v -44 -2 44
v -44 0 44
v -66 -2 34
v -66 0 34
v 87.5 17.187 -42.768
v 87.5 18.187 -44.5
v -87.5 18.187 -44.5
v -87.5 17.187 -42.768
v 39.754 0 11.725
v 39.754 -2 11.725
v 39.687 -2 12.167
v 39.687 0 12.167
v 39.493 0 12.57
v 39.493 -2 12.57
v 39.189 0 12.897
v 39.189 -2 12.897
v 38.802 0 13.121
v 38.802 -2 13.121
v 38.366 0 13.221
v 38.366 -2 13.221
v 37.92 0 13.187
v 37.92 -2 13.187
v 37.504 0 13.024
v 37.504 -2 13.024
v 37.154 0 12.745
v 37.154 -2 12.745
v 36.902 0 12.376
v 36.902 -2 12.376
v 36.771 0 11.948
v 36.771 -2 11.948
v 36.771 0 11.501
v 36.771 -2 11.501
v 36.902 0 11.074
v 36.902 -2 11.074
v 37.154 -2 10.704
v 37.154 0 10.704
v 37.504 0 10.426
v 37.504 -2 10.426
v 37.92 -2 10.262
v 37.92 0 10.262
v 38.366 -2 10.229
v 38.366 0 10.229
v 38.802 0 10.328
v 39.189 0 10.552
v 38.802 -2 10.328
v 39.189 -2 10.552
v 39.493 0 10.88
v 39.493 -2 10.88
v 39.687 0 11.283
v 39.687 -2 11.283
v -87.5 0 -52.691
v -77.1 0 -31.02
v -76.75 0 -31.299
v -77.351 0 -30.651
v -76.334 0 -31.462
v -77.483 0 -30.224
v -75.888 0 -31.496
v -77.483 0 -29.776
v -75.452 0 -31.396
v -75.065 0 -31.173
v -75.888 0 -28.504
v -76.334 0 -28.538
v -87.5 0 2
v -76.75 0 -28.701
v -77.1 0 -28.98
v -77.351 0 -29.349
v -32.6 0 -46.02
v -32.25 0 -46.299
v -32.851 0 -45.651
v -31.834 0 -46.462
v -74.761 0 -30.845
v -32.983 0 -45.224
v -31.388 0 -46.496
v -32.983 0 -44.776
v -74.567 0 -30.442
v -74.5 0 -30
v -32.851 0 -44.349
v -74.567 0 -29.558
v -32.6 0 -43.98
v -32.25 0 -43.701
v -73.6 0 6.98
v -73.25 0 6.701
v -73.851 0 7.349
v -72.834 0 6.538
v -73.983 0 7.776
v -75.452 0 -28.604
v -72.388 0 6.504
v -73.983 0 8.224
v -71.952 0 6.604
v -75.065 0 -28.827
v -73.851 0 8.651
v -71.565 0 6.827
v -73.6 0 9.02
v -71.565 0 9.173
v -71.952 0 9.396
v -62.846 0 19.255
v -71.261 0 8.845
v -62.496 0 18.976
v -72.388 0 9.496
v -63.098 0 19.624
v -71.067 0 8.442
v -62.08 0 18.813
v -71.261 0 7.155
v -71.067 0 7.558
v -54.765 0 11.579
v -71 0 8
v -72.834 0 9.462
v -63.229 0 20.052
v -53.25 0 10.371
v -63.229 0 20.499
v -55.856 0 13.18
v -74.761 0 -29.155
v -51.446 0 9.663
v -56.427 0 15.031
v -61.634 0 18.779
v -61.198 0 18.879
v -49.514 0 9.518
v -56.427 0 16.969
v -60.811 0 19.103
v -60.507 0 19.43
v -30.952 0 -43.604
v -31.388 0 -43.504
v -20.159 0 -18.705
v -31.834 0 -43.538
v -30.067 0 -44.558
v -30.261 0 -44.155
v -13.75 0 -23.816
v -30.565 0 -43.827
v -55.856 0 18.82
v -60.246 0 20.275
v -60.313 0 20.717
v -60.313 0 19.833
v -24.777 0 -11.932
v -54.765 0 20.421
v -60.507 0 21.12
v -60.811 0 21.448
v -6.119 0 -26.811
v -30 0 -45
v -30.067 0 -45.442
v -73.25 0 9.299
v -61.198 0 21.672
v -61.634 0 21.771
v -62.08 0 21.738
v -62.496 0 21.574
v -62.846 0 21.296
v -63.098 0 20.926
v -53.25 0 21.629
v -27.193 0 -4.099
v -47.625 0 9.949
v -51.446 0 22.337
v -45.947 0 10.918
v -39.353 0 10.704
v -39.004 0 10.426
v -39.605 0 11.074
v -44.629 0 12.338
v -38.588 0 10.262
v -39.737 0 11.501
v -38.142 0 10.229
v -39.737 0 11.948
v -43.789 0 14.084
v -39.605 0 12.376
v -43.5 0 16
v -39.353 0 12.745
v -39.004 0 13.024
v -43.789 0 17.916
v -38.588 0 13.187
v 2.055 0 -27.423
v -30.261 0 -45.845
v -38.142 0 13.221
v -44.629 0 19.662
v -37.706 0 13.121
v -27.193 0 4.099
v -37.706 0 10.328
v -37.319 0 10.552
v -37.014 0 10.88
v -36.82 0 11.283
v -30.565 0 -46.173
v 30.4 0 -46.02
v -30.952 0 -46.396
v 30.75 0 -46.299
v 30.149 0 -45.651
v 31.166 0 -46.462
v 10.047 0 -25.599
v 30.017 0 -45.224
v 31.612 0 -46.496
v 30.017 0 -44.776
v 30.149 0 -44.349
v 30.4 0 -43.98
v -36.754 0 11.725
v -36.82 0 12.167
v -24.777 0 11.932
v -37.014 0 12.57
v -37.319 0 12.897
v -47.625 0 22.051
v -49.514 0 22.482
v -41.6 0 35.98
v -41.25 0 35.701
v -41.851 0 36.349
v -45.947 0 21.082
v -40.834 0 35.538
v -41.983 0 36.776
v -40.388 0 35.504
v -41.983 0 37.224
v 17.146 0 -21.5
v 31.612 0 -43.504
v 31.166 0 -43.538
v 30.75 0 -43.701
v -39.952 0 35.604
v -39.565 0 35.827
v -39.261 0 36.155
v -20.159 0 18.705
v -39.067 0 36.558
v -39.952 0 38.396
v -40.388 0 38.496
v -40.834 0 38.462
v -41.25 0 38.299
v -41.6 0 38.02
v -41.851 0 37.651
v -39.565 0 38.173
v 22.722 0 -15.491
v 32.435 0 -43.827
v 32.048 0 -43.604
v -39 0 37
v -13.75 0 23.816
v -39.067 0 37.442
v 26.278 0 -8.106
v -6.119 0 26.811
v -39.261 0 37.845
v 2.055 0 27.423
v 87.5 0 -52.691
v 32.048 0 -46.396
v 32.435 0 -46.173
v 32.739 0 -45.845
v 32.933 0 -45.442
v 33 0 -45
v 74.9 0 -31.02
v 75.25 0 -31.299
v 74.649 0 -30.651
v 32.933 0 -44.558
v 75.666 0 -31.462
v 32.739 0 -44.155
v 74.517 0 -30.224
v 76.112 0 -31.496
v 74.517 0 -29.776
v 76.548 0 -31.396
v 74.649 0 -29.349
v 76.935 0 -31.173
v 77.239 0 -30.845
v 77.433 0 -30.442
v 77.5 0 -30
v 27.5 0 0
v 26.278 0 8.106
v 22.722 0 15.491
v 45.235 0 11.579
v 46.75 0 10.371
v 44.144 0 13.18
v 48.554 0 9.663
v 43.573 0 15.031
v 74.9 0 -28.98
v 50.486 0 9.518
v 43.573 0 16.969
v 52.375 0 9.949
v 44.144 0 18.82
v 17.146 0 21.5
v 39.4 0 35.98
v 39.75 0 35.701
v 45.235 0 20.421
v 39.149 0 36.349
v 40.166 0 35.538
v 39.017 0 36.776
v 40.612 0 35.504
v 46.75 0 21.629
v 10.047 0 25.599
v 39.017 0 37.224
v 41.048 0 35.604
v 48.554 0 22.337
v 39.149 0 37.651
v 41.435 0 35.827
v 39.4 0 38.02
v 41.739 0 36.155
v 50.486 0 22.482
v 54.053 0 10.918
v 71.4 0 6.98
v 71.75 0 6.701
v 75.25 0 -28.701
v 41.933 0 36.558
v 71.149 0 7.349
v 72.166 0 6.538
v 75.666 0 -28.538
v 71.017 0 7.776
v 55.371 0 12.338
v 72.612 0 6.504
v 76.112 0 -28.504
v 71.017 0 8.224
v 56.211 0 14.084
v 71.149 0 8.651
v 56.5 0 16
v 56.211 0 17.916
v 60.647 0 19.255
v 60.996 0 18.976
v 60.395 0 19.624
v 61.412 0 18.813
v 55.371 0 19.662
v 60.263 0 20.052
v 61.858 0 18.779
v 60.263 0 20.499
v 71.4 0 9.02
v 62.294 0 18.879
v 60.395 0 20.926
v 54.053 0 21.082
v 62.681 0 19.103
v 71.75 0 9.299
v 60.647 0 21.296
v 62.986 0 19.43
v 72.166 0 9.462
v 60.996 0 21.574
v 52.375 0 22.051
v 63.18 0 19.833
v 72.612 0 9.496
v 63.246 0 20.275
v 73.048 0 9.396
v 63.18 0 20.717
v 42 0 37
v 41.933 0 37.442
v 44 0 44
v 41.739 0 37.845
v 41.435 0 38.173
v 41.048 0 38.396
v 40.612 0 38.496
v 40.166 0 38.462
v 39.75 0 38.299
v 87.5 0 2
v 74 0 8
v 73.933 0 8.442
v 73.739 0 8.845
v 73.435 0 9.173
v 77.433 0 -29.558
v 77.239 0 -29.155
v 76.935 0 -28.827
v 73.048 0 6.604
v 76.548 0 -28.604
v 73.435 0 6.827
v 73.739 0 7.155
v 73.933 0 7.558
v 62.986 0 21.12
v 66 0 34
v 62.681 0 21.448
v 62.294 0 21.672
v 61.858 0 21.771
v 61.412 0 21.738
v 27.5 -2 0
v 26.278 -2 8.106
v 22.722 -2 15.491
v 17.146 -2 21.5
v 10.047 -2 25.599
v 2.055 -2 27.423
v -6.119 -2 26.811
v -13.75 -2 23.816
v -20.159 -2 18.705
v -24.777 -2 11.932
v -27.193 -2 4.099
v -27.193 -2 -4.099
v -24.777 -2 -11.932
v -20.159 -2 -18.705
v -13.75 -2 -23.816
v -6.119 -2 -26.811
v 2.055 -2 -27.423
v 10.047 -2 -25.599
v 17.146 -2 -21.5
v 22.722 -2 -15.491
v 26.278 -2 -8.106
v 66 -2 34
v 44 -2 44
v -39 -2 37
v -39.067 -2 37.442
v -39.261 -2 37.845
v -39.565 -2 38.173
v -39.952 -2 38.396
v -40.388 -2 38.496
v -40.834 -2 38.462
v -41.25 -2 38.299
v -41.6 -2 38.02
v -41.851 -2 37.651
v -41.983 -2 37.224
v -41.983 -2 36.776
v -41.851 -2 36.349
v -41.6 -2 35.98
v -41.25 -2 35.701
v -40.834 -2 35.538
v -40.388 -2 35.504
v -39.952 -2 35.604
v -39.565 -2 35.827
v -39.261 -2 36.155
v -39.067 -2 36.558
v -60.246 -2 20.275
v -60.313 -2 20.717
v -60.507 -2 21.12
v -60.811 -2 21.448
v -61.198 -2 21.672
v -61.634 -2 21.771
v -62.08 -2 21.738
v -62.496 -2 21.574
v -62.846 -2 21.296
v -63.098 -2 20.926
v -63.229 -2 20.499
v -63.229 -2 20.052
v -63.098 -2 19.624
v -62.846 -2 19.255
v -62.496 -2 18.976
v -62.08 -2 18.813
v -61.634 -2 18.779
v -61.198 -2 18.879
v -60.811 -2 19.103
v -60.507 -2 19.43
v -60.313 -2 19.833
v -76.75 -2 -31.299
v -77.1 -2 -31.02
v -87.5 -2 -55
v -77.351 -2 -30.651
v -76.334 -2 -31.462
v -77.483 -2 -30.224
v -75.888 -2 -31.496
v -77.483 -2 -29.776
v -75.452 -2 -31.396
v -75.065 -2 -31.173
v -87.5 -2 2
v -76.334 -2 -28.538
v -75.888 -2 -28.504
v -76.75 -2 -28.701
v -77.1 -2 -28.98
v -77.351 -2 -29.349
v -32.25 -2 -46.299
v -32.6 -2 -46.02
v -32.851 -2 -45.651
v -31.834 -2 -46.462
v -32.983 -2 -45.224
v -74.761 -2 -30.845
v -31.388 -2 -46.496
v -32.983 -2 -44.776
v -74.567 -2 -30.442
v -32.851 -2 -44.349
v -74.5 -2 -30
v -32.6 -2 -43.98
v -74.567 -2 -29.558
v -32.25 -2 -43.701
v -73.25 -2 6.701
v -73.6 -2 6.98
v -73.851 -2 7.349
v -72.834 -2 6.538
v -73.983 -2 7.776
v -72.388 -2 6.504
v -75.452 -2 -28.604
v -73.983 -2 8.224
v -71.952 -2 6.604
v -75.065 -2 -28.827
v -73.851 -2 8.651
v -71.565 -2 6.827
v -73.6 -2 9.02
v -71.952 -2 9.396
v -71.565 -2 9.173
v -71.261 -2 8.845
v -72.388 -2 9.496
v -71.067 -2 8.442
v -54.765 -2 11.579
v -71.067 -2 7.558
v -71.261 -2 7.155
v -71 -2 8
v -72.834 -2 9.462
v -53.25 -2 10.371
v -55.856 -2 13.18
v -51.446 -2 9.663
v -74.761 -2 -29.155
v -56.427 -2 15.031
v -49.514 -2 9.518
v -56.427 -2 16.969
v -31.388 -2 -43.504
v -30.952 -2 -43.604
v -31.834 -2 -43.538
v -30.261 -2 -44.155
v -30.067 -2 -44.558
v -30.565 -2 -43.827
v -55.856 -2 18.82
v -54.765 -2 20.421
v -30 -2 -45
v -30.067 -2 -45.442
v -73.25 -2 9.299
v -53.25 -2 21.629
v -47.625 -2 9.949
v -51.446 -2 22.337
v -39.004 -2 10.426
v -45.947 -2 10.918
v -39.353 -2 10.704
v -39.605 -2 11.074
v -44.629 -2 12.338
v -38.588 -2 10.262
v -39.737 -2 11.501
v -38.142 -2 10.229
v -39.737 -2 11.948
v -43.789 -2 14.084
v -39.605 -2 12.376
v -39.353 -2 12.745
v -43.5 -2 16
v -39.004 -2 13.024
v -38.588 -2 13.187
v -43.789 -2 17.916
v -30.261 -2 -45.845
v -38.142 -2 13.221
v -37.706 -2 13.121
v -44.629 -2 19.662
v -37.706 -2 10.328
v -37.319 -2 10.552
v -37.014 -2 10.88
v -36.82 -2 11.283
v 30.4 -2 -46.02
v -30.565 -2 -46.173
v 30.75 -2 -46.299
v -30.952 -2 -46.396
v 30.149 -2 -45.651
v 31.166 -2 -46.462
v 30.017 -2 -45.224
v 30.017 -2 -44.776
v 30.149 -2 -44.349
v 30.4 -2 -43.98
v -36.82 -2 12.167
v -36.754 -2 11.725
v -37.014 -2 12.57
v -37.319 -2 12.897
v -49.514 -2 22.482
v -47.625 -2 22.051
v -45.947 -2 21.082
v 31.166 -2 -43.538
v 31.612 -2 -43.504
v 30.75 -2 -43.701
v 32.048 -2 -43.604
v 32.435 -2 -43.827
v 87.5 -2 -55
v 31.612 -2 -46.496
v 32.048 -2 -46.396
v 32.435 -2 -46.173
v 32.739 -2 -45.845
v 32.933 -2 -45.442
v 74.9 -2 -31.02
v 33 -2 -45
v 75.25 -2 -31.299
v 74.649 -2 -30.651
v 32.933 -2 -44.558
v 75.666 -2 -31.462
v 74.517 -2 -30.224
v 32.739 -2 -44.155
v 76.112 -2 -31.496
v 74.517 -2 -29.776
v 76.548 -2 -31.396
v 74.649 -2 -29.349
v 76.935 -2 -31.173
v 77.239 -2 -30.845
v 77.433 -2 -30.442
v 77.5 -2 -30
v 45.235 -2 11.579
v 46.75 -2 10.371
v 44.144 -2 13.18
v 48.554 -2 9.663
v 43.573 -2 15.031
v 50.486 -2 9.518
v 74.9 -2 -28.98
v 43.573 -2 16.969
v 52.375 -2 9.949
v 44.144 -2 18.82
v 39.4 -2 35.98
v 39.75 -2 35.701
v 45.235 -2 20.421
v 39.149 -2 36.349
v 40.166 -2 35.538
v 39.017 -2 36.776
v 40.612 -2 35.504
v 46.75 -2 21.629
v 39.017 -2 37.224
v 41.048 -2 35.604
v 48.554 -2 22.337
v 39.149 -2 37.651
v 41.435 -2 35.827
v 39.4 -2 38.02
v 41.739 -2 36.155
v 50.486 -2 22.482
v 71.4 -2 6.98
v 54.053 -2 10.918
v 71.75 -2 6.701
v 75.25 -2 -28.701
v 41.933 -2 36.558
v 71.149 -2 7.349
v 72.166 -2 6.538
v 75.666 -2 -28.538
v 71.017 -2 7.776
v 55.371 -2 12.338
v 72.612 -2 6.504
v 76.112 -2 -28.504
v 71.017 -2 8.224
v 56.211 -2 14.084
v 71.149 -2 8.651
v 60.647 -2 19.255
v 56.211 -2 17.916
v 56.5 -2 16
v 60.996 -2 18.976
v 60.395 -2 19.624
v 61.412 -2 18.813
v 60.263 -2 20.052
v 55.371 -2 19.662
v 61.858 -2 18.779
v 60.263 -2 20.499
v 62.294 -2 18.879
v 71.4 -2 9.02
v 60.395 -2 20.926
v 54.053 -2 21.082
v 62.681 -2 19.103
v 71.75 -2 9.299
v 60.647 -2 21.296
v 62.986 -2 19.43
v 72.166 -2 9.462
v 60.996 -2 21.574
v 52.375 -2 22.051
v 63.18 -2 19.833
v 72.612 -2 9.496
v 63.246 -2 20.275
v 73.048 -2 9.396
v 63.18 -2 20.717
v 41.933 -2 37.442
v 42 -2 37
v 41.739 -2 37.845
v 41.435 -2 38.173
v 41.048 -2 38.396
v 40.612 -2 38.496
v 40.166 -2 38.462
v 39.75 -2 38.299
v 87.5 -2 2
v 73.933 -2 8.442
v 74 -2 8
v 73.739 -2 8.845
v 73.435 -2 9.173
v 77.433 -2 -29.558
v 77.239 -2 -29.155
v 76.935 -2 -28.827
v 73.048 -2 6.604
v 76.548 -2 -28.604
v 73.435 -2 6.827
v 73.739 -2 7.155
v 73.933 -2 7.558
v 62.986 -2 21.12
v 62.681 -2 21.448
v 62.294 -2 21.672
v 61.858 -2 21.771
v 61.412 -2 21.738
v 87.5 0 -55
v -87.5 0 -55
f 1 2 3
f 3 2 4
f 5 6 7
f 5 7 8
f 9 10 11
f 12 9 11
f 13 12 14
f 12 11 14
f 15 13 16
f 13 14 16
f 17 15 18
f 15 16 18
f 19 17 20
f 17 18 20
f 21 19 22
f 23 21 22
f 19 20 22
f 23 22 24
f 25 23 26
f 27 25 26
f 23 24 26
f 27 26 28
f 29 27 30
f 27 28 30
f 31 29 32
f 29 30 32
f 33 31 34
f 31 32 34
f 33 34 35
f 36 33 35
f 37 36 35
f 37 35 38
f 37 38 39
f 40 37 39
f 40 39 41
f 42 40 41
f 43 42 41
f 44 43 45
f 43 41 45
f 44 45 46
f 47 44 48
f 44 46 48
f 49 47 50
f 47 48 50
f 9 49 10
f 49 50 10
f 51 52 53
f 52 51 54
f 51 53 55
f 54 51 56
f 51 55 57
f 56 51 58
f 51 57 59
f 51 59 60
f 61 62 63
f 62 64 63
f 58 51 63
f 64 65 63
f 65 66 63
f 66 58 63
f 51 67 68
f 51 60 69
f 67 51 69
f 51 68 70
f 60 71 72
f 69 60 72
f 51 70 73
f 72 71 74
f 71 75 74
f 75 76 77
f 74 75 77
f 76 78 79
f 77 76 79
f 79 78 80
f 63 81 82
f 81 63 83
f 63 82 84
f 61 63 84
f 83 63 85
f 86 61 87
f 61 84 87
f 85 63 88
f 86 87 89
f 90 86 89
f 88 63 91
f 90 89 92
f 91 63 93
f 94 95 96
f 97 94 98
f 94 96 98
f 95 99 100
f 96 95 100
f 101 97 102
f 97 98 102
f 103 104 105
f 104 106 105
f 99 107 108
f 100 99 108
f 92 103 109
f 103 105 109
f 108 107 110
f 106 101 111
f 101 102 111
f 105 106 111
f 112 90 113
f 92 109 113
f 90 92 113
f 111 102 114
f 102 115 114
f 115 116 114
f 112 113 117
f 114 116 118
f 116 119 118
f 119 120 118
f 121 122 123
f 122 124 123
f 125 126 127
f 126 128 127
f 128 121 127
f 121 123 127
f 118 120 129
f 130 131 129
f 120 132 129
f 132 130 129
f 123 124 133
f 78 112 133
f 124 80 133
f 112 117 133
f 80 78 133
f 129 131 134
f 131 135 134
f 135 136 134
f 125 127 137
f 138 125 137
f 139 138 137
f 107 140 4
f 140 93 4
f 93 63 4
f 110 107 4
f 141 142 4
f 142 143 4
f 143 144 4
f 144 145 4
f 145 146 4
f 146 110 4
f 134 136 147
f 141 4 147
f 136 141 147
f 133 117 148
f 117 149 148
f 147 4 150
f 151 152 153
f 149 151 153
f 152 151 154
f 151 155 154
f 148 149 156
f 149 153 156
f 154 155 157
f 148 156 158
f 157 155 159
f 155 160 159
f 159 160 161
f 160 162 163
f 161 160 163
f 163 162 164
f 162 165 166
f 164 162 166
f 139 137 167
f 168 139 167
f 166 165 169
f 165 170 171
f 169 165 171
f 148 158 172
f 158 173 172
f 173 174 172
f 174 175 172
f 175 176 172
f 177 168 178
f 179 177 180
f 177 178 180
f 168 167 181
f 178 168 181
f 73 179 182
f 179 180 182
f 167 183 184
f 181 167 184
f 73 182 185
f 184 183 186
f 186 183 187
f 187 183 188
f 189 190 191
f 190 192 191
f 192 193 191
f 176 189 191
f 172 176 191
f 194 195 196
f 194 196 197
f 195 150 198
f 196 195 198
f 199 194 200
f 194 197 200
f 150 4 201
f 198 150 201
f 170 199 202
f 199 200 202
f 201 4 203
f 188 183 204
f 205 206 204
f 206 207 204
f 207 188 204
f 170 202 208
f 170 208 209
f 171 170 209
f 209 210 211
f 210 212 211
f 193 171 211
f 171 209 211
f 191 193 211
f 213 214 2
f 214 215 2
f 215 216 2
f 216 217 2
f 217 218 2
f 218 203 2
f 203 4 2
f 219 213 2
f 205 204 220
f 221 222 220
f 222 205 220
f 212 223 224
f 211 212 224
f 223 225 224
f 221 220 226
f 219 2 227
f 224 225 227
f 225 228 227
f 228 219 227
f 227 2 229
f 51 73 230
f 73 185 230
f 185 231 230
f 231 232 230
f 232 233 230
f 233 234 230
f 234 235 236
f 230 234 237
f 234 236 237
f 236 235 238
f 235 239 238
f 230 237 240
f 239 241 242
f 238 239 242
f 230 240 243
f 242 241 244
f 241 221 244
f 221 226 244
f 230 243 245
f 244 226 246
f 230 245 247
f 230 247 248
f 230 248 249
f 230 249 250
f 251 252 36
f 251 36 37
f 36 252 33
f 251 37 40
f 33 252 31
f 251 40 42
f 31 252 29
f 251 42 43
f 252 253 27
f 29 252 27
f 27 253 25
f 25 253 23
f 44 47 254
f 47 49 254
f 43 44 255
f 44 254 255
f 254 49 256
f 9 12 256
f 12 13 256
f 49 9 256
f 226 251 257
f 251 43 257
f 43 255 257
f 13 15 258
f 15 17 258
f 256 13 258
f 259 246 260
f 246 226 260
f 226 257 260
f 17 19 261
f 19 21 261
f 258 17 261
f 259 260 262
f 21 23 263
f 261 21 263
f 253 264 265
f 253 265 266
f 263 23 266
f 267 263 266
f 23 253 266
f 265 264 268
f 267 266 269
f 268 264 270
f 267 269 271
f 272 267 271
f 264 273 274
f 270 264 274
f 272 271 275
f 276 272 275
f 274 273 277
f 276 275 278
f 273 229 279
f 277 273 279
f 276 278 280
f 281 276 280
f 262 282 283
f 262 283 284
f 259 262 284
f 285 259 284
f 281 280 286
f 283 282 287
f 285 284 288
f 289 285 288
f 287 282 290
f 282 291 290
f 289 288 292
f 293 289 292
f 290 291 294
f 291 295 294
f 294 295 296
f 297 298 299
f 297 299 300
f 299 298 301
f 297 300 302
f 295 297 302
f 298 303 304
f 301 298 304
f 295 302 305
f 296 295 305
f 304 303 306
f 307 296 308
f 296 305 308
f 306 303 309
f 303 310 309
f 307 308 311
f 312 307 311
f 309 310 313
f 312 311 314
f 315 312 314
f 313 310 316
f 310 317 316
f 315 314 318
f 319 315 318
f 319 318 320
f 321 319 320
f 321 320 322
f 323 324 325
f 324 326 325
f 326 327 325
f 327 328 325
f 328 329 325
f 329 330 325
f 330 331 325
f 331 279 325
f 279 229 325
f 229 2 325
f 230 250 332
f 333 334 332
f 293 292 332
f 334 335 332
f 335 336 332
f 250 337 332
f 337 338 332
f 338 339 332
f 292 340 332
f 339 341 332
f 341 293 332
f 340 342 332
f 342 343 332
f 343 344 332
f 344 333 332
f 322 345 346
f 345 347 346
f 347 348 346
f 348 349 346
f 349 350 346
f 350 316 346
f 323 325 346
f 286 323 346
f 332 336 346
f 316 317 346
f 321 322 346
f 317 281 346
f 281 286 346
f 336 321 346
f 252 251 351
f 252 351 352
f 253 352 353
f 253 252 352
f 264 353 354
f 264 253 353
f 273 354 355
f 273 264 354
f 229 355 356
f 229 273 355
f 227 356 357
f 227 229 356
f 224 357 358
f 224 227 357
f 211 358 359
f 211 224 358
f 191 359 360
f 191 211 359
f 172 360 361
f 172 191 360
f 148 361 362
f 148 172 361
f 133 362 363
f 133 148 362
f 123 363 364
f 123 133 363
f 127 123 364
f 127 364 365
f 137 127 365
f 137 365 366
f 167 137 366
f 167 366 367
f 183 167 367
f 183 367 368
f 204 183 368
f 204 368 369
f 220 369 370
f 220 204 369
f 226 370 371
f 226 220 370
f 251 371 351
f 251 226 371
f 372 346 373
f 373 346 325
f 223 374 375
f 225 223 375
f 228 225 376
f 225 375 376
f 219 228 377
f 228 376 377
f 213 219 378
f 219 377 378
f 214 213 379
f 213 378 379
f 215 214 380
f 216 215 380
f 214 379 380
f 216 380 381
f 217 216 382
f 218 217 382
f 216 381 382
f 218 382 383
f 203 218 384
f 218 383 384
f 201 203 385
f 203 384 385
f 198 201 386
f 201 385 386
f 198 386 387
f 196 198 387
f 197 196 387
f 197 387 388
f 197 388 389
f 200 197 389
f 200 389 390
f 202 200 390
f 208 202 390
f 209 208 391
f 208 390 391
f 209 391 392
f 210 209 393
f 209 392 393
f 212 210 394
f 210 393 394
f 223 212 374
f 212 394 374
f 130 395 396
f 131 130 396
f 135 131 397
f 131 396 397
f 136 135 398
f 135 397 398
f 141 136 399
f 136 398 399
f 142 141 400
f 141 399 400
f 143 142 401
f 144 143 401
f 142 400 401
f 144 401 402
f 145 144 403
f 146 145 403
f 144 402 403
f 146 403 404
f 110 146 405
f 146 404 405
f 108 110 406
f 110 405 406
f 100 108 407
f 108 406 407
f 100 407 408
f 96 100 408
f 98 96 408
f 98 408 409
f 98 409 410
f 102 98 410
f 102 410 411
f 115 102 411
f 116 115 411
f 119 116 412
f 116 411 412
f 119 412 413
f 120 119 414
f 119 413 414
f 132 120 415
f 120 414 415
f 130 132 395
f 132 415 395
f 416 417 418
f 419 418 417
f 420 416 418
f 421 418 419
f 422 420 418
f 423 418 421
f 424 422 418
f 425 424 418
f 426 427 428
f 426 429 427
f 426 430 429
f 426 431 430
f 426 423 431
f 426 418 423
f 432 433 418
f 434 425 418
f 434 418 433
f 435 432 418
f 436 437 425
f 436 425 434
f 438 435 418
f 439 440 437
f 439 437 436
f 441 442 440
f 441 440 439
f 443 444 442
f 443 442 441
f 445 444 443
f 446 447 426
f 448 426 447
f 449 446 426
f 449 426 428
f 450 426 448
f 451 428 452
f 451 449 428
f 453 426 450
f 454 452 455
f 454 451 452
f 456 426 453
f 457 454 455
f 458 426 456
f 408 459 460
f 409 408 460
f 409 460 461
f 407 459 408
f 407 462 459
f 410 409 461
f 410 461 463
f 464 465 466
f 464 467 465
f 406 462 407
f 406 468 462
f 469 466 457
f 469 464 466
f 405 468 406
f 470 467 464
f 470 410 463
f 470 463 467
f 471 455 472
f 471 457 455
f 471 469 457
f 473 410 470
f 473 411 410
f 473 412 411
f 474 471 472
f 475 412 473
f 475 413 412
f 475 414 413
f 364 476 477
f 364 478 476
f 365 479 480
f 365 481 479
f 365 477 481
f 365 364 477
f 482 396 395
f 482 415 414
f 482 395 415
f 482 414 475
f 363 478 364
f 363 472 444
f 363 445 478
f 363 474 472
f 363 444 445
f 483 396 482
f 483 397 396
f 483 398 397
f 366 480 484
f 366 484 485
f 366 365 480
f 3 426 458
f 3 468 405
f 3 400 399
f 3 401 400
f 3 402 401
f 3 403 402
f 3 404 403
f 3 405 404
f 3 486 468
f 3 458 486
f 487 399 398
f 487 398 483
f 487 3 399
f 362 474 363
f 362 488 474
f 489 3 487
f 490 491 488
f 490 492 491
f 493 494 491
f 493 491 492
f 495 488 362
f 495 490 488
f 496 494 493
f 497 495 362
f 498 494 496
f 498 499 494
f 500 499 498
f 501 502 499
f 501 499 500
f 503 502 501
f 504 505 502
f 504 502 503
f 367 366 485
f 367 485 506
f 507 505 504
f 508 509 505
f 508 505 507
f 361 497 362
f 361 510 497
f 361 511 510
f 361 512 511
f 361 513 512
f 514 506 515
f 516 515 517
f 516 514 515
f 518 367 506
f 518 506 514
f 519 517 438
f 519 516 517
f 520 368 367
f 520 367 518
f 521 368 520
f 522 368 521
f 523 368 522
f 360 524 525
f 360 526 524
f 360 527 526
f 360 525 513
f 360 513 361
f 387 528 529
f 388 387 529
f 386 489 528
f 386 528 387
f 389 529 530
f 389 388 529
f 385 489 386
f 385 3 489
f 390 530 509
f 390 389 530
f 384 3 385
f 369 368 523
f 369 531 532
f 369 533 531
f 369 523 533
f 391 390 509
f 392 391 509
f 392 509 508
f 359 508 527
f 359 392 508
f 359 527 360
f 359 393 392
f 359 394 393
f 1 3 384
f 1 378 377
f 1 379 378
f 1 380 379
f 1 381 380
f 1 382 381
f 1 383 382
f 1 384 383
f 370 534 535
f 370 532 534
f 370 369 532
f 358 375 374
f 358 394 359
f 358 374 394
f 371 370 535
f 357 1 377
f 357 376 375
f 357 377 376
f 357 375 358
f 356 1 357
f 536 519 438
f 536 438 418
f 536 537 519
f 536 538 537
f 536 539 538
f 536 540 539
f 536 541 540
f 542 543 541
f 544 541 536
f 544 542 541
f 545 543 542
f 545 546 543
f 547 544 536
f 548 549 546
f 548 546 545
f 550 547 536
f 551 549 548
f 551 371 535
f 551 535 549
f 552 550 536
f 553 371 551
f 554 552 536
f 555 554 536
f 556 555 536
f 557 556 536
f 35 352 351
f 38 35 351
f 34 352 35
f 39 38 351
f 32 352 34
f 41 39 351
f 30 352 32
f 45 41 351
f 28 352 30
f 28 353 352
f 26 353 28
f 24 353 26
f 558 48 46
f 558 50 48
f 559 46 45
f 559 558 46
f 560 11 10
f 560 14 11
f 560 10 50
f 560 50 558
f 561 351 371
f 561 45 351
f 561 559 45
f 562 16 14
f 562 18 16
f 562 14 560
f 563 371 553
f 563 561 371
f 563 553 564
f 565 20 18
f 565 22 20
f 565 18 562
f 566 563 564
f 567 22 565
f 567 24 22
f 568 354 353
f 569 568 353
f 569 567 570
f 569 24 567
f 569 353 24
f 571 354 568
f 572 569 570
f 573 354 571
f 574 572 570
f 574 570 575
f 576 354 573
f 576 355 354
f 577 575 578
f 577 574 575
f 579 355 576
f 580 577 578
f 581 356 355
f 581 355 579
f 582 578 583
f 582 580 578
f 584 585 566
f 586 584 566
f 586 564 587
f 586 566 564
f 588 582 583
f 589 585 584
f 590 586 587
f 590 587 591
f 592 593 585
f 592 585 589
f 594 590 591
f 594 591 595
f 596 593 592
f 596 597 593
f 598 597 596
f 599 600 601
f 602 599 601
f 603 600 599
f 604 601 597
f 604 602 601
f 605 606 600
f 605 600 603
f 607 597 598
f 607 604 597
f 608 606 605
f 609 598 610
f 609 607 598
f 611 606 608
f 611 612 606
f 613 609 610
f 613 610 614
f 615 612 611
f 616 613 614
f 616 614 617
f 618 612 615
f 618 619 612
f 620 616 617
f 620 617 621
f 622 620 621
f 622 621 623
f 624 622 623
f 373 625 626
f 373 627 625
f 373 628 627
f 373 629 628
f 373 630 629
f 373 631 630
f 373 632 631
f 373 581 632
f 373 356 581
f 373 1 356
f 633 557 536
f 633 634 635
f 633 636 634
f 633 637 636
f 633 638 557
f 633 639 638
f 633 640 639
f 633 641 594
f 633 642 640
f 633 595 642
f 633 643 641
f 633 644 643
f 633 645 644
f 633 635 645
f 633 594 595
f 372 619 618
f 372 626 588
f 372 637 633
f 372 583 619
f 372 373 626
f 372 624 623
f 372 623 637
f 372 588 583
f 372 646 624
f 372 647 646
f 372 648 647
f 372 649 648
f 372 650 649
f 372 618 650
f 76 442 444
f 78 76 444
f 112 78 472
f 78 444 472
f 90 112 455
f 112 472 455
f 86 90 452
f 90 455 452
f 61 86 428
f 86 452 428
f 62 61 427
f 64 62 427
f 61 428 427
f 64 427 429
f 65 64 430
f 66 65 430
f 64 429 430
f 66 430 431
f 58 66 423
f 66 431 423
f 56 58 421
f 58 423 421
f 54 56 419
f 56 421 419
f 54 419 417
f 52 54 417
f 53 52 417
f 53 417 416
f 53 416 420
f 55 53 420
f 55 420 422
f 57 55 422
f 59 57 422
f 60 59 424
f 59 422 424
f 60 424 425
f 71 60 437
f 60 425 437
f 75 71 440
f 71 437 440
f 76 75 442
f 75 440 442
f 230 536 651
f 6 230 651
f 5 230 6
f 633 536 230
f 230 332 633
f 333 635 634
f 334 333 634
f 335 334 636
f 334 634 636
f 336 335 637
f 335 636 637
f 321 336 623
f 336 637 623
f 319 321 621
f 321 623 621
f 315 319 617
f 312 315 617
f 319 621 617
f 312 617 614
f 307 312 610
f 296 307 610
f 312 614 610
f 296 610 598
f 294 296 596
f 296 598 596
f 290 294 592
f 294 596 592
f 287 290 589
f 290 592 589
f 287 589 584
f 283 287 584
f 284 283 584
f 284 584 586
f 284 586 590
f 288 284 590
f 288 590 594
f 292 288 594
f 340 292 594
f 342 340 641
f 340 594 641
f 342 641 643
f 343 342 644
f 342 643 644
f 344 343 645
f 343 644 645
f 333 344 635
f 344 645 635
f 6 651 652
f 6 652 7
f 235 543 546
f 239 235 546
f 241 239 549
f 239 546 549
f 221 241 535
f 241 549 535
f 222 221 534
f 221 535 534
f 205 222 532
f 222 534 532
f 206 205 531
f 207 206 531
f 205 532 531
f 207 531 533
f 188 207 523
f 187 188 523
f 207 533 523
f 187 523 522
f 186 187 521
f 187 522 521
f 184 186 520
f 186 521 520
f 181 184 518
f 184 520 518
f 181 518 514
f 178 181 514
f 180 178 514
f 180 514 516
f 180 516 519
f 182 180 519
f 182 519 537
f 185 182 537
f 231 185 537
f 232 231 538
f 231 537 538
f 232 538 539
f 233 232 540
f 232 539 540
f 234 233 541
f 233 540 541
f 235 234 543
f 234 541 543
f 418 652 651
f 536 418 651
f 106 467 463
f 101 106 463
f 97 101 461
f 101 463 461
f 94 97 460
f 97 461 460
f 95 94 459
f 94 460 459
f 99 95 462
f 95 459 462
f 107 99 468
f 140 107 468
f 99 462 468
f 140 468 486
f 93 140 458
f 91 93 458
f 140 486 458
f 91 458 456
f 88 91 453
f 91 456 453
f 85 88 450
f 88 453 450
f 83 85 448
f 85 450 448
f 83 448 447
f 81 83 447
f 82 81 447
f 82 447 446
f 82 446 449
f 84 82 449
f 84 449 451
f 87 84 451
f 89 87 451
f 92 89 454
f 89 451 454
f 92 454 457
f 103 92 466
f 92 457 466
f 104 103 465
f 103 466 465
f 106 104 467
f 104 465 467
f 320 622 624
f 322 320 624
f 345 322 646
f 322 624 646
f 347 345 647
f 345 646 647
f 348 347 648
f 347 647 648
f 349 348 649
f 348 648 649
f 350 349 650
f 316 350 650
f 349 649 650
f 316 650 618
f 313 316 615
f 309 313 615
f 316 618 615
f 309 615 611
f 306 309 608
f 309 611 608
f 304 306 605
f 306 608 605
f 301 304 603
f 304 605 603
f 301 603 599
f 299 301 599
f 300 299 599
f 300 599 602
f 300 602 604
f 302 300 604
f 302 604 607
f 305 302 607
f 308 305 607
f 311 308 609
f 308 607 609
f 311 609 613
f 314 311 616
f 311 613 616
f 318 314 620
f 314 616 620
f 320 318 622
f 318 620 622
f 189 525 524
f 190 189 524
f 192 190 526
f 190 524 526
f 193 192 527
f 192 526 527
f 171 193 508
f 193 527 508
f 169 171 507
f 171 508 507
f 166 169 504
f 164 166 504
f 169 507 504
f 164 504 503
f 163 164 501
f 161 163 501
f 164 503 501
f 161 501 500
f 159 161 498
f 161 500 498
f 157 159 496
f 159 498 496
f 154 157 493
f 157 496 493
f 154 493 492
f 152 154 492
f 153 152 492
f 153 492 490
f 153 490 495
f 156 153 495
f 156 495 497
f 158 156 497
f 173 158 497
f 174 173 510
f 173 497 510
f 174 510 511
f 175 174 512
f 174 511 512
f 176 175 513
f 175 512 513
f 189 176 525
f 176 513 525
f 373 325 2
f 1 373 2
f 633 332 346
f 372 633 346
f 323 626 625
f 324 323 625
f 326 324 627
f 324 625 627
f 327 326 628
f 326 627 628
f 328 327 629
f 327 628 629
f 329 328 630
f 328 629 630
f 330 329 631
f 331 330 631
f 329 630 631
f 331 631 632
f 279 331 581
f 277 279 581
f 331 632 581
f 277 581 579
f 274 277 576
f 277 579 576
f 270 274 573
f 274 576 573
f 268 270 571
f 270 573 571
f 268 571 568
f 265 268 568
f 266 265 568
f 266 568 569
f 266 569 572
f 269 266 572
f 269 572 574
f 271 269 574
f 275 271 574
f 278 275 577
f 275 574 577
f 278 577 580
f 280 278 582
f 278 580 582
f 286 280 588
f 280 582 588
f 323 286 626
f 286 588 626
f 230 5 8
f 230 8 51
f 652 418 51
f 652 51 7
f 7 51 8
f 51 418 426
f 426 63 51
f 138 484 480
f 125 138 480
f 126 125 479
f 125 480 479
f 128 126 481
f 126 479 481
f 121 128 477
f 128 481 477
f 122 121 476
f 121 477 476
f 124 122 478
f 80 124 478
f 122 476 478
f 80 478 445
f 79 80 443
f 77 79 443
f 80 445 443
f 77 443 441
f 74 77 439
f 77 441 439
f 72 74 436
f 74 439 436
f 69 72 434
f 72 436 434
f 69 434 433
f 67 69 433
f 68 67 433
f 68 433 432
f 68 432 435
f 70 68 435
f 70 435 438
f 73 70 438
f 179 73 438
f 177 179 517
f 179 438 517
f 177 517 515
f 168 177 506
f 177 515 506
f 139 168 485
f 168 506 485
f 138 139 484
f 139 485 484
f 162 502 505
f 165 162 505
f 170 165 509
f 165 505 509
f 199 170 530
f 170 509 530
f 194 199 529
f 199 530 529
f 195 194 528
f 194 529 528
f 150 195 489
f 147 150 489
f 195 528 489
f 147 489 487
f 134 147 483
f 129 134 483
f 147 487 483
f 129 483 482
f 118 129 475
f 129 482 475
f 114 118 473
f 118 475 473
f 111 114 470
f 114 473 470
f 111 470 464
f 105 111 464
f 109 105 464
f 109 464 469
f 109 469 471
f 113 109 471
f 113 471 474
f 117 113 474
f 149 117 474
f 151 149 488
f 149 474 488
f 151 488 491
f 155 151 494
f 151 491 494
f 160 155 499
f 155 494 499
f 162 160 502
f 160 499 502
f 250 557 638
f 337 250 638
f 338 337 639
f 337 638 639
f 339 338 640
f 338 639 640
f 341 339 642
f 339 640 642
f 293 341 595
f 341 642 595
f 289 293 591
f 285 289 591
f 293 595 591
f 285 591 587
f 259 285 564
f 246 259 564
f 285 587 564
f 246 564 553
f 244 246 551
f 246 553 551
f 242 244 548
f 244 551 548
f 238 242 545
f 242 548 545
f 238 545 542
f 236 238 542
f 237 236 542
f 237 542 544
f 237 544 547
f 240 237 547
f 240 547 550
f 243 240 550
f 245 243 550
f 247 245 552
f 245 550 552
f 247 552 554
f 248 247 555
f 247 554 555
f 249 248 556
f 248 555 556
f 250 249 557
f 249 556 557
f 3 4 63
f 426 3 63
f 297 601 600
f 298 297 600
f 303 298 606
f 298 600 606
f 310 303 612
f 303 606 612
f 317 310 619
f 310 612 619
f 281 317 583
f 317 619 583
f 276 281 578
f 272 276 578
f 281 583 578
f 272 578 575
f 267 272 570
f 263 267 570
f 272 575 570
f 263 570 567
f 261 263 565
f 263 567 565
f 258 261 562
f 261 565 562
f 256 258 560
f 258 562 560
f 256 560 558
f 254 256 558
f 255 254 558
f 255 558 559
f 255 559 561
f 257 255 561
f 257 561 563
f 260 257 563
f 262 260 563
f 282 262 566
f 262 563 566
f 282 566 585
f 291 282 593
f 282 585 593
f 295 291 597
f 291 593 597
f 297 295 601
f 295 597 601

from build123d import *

# Parameters (mm, degrees)
F0_R     = 27.5
F1_DEPTH = 2
F2_R     = 6.5
F2_R_2   = 1.5
F3_DEPTH = 2
F4_R     = 1.5
F5_DEPTH = 2
F7_DEPTH = 175


with BuildPart() as f1:
    # F0 (on Front) → F1 (new body)
    with BuildSketch(Plane.XZ):
        Polygon((44, 44), (-44, 44), (-66, 34), (-87.5, 2), (-87.5, -55), (87.5, -55), (87.5, 2), (66, 34), align=None)
        Circle(F0_R, mode=Mode.SUBTRACT)
    extrude(amount=F1_DEPTH)

    # F2 (on face) → F3 (cut, through all)
    with BuildSketch(Plane.XZ.offset(2)):
        with Locations((50, 16)):
            Circle(F2_R)
        with Locations((61.746158, 20.275252)):
            Circle(F2_R_2)
        with Locations((38.253842, 11.724748)):
            Circle(F2_R_2)
        with Locations((-38.253842, 11.724748)):
            Circle(F2_R_2)
        with Locations((-61.746158, 20.275252)):
            Circle(F2_R_2)
        with Locations((-50, 16)):
            Circle(F2_R)
    extrude(amount=-F3_DEPTH, mode=Mode.SUBTRACT)

    # F4 (on face) → F5 (cut, through all)
    with BuildSketch(Plane.XZ.offset(2)):
        with Locations((-31.5, -45)):
            Circle(F4_R)
        with Locations((31.5, -45)):
            Circle(F4_R)
        with Locations((76, -30)):
            Circle(F4_R)
        with Locations((72.5, 8)):
            Circle(F4_R)
        with Locations((40.5, 37)):
            Circle(F4_R)
        with Locations((-40.5, 37)):
            Circle(F4_R)
        with Locations((-76, -30)):
            Circle(F4_R)
        with Locations((-72.5, 8)):
            Circle(F4_R)
    extrude(amount=-F5_DEPTH, mode=Mode.SUBTRACT)

    # F6 (on face) → F7 (join, through all)
    with BuildSketch(Plane.YZ.offset(87.5)):
        Polygon((0, -52.690599), (0, -55), (18.186533, -44.5), (17.186533, -42.767949), align=None)
    extrude(amount=-F7_DEPTH)


solid = f1.part
